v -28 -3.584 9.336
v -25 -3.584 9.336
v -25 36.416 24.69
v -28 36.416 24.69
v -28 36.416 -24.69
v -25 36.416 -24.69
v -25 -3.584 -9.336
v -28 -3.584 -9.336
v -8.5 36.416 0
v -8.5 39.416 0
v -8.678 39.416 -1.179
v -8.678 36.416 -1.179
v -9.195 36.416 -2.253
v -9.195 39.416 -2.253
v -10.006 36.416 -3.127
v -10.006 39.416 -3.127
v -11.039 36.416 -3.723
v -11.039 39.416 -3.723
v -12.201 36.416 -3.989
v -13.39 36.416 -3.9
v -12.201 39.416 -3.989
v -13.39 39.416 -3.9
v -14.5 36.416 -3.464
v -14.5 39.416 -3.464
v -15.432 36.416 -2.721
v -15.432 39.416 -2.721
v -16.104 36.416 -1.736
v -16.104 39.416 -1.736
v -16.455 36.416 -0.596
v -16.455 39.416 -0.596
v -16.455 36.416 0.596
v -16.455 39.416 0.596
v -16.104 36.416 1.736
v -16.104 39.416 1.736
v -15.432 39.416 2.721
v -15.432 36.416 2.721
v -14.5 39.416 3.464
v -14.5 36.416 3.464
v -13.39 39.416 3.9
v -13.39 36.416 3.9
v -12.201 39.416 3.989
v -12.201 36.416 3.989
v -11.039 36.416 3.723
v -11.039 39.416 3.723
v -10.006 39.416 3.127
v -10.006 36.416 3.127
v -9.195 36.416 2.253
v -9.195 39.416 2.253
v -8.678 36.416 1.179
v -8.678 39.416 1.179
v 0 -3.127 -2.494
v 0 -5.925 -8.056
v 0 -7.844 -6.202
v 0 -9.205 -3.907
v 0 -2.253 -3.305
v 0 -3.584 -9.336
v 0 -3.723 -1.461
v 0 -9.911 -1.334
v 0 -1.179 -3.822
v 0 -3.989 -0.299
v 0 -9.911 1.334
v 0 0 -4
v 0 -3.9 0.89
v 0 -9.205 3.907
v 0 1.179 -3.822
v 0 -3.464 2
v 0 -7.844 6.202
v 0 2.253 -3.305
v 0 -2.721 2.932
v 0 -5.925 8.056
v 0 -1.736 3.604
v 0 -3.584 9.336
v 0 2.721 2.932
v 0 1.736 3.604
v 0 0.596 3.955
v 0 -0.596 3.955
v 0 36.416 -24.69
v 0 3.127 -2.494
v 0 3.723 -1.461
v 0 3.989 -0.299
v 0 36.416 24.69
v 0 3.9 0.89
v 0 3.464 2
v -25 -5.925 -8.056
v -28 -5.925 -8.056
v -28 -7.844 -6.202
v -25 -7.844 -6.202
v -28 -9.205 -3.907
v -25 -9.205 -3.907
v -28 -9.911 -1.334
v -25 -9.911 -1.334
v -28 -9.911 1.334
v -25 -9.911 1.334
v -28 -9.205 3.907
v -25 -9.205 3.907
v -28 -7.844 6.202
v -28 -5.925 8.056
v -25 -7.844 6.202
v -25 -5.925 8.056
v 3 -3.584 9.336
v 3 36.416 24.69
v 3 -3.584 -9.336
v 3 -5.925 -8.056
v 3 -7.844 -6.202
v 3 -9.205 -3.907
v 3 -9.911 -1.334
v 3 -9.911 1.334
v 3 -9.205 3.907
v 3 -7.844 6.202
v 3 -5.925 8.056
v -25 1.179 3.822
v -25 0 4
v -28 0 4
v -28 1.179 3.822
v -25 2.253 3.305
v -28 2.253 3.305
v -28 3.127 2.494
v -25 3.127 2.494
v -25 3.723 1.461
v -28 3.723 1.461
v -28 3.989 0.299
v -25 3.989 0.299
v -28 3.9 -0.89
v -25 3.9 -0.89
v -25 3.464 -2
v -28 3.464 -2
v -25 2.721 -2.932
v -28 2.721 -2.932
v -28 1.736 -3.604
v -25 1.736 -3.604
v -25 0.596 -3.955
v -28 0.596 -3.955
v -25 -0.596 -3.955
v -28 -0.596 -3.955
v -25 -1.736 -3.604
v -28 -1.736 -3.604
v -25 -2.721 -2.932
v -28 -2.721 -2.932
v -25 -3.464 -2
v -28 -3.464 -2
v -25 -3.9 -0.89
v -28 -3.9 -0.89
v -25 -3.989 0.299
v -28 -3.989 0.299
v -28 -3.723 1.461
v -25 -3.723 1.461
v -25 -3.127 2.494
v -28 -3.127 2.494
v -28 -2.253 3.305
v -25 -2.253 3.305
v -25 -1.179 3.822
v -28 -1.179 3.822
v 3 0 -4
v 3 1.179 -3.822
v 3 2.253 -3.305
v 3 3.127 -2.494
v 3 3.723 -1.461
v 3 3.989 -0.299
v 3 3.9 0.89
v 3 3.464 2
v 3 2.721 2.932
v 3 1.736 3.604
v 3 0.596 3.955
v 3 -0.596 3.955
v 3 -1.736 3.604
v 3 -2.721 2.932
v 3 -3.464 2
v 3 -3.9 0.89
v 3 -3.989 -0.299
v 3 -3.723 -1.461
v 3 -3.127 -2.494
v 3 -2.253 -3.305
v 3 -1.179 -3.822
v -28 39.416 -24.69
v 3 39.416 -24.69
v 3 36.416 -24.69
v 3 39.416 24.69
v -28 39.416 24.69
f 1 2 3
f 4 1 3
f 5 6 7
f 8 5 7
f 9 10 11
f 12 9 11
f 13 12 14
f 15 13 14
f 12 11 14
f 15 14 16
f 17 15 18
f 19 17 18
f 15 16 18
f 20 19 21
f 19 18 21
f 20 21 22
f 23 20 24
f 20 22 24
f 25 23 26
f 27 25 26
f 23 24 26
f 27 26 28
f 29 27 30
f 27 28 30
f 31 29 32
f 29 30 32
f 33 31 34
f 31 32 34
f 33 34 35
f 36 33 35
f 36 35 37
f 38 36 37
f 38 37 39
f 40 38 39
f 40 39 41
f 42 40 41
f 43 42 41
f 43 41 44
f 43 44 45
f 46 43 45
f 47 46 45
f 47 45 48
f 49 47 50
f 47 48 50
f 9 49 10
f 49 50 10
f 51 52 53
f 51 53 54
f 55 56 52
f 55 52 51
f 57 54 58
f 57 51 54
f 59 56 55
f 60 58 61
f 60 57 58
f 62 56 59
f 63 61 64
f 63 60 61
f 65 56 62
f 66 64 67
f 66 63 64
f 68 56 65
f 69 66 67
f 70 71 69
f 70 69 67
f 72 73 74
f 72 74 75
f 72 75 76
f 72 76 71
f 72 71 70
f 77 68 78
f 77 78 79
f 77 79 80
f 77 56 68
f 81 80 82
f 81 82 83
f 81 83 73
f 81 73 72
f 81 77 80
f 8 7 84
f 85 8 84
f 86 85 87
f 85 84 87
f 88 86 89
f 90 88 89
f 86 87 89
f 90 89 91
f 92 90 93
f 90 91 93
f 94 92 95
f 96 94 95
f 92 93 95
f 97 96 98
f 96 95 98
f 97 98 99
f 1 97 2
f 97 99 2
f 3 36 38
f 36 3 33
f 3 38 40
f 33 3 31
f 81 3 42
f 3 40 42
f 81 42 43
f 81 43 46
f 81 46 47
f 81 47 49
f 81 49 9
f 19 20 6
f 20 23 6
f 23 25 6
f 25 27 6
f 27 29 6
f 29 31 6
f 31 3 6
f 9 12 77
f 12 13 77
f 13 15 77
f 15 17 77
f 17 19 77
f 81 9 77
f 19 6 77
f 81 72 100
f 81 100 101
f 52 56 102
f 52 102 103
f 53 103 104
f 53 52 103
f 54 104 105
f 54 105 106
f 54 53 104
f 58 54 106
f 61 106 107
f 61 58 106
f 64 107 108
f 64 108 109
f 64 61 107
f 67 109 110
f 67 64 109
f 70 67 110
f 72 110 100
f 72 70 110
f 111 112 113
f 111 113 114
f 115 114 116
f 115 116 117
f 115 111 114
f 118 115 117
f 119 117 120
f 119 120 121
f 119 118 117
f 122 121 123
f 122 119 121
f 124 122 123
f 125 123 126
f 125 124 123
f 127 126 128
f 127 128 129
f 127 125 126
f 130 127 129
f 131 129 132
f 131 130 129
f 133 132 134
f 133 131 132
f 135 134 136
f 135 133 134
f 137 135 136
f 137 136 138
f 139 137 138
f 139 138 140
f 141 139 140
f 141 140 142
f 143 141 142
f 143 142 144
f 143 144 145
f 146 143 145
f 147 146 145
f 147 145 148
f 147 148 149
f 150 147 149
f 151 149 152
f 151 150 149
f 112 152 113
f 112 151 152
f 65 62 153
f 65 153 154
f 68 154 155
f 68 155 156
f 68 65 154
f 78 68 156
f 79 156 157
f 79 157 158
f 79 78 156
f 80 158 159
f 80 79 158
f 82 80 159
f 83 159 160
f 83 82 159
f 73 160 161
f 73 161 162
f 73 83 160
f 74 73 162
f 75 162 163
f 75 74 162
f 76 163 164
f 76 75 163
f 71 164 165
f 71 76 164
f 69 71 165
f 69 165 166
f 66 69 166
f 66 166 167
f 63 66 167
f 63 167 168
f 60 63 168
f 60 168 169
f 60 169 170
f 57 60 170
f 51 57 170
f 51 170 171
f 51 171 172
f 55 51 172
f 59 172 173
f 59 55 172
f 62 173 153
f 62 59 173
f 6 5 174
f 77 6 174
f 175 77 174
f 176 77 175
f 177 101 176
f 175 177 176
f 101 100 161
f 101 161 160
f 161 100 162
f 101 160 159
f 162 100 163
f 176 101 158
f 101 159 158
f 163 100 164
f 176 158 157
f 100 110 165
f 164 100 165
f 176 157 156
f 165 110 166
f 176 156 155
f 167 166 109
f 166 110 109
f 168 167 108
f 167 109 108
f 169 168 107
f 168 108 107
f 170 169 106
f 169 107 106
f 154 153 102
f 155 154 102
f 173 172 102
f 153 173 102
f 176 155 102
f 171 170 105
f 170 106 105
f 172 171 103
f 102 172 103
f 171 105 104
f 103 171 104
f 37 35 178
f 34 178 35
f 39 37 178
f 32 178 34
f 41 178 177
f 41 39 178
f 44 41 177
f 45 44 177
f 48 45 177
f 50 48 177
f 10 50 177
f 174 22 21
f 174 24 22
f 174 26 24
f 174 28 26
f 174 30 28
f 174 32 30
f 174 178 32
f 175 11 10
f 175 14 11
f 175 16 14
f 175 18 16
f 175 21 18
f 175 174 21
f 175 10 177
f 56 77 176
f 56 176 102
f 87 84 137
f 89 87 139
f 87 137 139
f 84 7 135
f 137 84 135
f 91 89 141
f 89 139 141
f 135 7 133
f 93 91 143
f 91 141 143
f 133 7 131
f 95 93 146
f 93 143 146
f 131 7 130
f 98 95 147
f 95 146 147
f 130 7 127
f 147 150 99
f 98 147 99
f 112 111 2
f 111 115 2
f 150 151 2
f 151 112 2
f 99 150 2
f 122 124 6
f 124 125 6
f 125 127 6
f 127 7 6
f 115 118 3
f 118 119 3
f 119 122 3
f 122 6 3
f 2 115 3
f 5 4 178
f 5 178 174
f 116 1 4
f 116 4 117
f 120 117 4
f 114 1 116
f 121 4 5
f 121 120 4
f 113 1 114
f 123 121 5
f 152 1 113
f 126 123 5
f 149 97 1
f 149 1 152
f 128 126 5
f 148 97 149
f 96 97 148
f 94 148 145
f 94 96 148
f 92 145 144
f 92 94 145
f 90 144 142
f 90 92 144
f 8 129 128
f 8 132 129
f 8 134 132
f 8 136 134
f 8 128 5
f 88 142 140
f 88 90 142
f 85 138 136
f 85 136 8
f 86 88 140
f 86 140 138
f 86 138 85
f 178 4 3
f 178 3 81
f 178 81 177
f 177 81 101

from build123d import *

# Parameters (mm, degrees)
CROQUIS1_R              = 4
SALIENTE_EXTRUIR1_DEPTH = 3
CROQUIS2_R              = 4
SALIENTE_EXTRUIR2_DEPTH = 3
CROQUIS3_W              = 31
CROQUIS3_H              = 49.380731332
SALIENTE_EXTRUIR3_DEPTH = 3
CROQUIS5_R              = 4
CORTAR_EXTRUIR1_DEPTH   = 3


with BuildPart() as part:
    # Croquis1 → Saliente-Extruir1 (new body)
    with BuildSketch(Plane(origin=(0, 0, 0), x_dir=(0, 0, -1), z_dir=(1, 0, 0))):
        with BuildLine():
            Line((-9.335804265, -3.583679495), (-24.690365666, 36.416320505))
            Line((-24.690365666, 36.416320505), (24.690365666, 36.416320505))
            Line((24.690365666, 36.416320505), (9.335804265, -3.583679495))
            ThreePointArc((9.335804265, -3.583679495), (0, -10), (-9.335804265, -3.583679495))
        make_face()
        Circle(CROQUIS1_R, mode=Mode.SUBTRACT)
    extrude(amount=SALIENTE_EXTRUIR1_DEPTH)



with BuildPart() as body_2:
    # Croquis2 → Saliente-Extruir2 (new body)
    with BuildSketch(Plane.ZY.offset(25)):
        with BuildLine():
            Line((9.335804265, -3.583679495), (24.690365666, 36.416320505))
            Line((24.690365666, 36.416320505), (-24.690365666, 36.416320505))
            Line((-24.690365666, 36.416320505), (-9.335804265, -3.583679495))
            ThreePointArc((-9.335804265, -3.583679495), (0, -10), (9.335804265, -3.583679495))
        make_face()
        Circle(CROQUIS2_R, mode=Mode.SUBTRACT)
    extrude(amount=SALIENTE_EXTRUIR2_DEPTH)


with BuildPart() as part_1:
    add(part.part)

    add(body_2.part)  # Saliente-Extruir3 merges body 2
    # Croquis3 → Saliente-Extruir3 (add)
    with BuildSketch(Plane(origin=(0, 36.416320505, 0), x_dir=(1, 0, 0), z_dir=(0, 1, 0))):
        with Locations((-12.5, 0)):
            Rectangle(CROQUIS3_W, CROQUIS3_H)
    extrude(amount=SALIENTE_EXTRUIR3_DEPTH)

    # Croquis5 → Cortar-Extruir1 (cut)
    with BuildSketch(Plane(origin=(0, 39.416320505, 0), x_dir=(1, 0, 0), z_dir=(0, 1, 0))):
        with Locations((-12.5, 0)):
            Circle(CROQUIS5_R)
    extrude(amount=-CORTAR_EXTRUIR1_DEPTH, mode=Mode.SUBTRACT)


solid = part_1.part
